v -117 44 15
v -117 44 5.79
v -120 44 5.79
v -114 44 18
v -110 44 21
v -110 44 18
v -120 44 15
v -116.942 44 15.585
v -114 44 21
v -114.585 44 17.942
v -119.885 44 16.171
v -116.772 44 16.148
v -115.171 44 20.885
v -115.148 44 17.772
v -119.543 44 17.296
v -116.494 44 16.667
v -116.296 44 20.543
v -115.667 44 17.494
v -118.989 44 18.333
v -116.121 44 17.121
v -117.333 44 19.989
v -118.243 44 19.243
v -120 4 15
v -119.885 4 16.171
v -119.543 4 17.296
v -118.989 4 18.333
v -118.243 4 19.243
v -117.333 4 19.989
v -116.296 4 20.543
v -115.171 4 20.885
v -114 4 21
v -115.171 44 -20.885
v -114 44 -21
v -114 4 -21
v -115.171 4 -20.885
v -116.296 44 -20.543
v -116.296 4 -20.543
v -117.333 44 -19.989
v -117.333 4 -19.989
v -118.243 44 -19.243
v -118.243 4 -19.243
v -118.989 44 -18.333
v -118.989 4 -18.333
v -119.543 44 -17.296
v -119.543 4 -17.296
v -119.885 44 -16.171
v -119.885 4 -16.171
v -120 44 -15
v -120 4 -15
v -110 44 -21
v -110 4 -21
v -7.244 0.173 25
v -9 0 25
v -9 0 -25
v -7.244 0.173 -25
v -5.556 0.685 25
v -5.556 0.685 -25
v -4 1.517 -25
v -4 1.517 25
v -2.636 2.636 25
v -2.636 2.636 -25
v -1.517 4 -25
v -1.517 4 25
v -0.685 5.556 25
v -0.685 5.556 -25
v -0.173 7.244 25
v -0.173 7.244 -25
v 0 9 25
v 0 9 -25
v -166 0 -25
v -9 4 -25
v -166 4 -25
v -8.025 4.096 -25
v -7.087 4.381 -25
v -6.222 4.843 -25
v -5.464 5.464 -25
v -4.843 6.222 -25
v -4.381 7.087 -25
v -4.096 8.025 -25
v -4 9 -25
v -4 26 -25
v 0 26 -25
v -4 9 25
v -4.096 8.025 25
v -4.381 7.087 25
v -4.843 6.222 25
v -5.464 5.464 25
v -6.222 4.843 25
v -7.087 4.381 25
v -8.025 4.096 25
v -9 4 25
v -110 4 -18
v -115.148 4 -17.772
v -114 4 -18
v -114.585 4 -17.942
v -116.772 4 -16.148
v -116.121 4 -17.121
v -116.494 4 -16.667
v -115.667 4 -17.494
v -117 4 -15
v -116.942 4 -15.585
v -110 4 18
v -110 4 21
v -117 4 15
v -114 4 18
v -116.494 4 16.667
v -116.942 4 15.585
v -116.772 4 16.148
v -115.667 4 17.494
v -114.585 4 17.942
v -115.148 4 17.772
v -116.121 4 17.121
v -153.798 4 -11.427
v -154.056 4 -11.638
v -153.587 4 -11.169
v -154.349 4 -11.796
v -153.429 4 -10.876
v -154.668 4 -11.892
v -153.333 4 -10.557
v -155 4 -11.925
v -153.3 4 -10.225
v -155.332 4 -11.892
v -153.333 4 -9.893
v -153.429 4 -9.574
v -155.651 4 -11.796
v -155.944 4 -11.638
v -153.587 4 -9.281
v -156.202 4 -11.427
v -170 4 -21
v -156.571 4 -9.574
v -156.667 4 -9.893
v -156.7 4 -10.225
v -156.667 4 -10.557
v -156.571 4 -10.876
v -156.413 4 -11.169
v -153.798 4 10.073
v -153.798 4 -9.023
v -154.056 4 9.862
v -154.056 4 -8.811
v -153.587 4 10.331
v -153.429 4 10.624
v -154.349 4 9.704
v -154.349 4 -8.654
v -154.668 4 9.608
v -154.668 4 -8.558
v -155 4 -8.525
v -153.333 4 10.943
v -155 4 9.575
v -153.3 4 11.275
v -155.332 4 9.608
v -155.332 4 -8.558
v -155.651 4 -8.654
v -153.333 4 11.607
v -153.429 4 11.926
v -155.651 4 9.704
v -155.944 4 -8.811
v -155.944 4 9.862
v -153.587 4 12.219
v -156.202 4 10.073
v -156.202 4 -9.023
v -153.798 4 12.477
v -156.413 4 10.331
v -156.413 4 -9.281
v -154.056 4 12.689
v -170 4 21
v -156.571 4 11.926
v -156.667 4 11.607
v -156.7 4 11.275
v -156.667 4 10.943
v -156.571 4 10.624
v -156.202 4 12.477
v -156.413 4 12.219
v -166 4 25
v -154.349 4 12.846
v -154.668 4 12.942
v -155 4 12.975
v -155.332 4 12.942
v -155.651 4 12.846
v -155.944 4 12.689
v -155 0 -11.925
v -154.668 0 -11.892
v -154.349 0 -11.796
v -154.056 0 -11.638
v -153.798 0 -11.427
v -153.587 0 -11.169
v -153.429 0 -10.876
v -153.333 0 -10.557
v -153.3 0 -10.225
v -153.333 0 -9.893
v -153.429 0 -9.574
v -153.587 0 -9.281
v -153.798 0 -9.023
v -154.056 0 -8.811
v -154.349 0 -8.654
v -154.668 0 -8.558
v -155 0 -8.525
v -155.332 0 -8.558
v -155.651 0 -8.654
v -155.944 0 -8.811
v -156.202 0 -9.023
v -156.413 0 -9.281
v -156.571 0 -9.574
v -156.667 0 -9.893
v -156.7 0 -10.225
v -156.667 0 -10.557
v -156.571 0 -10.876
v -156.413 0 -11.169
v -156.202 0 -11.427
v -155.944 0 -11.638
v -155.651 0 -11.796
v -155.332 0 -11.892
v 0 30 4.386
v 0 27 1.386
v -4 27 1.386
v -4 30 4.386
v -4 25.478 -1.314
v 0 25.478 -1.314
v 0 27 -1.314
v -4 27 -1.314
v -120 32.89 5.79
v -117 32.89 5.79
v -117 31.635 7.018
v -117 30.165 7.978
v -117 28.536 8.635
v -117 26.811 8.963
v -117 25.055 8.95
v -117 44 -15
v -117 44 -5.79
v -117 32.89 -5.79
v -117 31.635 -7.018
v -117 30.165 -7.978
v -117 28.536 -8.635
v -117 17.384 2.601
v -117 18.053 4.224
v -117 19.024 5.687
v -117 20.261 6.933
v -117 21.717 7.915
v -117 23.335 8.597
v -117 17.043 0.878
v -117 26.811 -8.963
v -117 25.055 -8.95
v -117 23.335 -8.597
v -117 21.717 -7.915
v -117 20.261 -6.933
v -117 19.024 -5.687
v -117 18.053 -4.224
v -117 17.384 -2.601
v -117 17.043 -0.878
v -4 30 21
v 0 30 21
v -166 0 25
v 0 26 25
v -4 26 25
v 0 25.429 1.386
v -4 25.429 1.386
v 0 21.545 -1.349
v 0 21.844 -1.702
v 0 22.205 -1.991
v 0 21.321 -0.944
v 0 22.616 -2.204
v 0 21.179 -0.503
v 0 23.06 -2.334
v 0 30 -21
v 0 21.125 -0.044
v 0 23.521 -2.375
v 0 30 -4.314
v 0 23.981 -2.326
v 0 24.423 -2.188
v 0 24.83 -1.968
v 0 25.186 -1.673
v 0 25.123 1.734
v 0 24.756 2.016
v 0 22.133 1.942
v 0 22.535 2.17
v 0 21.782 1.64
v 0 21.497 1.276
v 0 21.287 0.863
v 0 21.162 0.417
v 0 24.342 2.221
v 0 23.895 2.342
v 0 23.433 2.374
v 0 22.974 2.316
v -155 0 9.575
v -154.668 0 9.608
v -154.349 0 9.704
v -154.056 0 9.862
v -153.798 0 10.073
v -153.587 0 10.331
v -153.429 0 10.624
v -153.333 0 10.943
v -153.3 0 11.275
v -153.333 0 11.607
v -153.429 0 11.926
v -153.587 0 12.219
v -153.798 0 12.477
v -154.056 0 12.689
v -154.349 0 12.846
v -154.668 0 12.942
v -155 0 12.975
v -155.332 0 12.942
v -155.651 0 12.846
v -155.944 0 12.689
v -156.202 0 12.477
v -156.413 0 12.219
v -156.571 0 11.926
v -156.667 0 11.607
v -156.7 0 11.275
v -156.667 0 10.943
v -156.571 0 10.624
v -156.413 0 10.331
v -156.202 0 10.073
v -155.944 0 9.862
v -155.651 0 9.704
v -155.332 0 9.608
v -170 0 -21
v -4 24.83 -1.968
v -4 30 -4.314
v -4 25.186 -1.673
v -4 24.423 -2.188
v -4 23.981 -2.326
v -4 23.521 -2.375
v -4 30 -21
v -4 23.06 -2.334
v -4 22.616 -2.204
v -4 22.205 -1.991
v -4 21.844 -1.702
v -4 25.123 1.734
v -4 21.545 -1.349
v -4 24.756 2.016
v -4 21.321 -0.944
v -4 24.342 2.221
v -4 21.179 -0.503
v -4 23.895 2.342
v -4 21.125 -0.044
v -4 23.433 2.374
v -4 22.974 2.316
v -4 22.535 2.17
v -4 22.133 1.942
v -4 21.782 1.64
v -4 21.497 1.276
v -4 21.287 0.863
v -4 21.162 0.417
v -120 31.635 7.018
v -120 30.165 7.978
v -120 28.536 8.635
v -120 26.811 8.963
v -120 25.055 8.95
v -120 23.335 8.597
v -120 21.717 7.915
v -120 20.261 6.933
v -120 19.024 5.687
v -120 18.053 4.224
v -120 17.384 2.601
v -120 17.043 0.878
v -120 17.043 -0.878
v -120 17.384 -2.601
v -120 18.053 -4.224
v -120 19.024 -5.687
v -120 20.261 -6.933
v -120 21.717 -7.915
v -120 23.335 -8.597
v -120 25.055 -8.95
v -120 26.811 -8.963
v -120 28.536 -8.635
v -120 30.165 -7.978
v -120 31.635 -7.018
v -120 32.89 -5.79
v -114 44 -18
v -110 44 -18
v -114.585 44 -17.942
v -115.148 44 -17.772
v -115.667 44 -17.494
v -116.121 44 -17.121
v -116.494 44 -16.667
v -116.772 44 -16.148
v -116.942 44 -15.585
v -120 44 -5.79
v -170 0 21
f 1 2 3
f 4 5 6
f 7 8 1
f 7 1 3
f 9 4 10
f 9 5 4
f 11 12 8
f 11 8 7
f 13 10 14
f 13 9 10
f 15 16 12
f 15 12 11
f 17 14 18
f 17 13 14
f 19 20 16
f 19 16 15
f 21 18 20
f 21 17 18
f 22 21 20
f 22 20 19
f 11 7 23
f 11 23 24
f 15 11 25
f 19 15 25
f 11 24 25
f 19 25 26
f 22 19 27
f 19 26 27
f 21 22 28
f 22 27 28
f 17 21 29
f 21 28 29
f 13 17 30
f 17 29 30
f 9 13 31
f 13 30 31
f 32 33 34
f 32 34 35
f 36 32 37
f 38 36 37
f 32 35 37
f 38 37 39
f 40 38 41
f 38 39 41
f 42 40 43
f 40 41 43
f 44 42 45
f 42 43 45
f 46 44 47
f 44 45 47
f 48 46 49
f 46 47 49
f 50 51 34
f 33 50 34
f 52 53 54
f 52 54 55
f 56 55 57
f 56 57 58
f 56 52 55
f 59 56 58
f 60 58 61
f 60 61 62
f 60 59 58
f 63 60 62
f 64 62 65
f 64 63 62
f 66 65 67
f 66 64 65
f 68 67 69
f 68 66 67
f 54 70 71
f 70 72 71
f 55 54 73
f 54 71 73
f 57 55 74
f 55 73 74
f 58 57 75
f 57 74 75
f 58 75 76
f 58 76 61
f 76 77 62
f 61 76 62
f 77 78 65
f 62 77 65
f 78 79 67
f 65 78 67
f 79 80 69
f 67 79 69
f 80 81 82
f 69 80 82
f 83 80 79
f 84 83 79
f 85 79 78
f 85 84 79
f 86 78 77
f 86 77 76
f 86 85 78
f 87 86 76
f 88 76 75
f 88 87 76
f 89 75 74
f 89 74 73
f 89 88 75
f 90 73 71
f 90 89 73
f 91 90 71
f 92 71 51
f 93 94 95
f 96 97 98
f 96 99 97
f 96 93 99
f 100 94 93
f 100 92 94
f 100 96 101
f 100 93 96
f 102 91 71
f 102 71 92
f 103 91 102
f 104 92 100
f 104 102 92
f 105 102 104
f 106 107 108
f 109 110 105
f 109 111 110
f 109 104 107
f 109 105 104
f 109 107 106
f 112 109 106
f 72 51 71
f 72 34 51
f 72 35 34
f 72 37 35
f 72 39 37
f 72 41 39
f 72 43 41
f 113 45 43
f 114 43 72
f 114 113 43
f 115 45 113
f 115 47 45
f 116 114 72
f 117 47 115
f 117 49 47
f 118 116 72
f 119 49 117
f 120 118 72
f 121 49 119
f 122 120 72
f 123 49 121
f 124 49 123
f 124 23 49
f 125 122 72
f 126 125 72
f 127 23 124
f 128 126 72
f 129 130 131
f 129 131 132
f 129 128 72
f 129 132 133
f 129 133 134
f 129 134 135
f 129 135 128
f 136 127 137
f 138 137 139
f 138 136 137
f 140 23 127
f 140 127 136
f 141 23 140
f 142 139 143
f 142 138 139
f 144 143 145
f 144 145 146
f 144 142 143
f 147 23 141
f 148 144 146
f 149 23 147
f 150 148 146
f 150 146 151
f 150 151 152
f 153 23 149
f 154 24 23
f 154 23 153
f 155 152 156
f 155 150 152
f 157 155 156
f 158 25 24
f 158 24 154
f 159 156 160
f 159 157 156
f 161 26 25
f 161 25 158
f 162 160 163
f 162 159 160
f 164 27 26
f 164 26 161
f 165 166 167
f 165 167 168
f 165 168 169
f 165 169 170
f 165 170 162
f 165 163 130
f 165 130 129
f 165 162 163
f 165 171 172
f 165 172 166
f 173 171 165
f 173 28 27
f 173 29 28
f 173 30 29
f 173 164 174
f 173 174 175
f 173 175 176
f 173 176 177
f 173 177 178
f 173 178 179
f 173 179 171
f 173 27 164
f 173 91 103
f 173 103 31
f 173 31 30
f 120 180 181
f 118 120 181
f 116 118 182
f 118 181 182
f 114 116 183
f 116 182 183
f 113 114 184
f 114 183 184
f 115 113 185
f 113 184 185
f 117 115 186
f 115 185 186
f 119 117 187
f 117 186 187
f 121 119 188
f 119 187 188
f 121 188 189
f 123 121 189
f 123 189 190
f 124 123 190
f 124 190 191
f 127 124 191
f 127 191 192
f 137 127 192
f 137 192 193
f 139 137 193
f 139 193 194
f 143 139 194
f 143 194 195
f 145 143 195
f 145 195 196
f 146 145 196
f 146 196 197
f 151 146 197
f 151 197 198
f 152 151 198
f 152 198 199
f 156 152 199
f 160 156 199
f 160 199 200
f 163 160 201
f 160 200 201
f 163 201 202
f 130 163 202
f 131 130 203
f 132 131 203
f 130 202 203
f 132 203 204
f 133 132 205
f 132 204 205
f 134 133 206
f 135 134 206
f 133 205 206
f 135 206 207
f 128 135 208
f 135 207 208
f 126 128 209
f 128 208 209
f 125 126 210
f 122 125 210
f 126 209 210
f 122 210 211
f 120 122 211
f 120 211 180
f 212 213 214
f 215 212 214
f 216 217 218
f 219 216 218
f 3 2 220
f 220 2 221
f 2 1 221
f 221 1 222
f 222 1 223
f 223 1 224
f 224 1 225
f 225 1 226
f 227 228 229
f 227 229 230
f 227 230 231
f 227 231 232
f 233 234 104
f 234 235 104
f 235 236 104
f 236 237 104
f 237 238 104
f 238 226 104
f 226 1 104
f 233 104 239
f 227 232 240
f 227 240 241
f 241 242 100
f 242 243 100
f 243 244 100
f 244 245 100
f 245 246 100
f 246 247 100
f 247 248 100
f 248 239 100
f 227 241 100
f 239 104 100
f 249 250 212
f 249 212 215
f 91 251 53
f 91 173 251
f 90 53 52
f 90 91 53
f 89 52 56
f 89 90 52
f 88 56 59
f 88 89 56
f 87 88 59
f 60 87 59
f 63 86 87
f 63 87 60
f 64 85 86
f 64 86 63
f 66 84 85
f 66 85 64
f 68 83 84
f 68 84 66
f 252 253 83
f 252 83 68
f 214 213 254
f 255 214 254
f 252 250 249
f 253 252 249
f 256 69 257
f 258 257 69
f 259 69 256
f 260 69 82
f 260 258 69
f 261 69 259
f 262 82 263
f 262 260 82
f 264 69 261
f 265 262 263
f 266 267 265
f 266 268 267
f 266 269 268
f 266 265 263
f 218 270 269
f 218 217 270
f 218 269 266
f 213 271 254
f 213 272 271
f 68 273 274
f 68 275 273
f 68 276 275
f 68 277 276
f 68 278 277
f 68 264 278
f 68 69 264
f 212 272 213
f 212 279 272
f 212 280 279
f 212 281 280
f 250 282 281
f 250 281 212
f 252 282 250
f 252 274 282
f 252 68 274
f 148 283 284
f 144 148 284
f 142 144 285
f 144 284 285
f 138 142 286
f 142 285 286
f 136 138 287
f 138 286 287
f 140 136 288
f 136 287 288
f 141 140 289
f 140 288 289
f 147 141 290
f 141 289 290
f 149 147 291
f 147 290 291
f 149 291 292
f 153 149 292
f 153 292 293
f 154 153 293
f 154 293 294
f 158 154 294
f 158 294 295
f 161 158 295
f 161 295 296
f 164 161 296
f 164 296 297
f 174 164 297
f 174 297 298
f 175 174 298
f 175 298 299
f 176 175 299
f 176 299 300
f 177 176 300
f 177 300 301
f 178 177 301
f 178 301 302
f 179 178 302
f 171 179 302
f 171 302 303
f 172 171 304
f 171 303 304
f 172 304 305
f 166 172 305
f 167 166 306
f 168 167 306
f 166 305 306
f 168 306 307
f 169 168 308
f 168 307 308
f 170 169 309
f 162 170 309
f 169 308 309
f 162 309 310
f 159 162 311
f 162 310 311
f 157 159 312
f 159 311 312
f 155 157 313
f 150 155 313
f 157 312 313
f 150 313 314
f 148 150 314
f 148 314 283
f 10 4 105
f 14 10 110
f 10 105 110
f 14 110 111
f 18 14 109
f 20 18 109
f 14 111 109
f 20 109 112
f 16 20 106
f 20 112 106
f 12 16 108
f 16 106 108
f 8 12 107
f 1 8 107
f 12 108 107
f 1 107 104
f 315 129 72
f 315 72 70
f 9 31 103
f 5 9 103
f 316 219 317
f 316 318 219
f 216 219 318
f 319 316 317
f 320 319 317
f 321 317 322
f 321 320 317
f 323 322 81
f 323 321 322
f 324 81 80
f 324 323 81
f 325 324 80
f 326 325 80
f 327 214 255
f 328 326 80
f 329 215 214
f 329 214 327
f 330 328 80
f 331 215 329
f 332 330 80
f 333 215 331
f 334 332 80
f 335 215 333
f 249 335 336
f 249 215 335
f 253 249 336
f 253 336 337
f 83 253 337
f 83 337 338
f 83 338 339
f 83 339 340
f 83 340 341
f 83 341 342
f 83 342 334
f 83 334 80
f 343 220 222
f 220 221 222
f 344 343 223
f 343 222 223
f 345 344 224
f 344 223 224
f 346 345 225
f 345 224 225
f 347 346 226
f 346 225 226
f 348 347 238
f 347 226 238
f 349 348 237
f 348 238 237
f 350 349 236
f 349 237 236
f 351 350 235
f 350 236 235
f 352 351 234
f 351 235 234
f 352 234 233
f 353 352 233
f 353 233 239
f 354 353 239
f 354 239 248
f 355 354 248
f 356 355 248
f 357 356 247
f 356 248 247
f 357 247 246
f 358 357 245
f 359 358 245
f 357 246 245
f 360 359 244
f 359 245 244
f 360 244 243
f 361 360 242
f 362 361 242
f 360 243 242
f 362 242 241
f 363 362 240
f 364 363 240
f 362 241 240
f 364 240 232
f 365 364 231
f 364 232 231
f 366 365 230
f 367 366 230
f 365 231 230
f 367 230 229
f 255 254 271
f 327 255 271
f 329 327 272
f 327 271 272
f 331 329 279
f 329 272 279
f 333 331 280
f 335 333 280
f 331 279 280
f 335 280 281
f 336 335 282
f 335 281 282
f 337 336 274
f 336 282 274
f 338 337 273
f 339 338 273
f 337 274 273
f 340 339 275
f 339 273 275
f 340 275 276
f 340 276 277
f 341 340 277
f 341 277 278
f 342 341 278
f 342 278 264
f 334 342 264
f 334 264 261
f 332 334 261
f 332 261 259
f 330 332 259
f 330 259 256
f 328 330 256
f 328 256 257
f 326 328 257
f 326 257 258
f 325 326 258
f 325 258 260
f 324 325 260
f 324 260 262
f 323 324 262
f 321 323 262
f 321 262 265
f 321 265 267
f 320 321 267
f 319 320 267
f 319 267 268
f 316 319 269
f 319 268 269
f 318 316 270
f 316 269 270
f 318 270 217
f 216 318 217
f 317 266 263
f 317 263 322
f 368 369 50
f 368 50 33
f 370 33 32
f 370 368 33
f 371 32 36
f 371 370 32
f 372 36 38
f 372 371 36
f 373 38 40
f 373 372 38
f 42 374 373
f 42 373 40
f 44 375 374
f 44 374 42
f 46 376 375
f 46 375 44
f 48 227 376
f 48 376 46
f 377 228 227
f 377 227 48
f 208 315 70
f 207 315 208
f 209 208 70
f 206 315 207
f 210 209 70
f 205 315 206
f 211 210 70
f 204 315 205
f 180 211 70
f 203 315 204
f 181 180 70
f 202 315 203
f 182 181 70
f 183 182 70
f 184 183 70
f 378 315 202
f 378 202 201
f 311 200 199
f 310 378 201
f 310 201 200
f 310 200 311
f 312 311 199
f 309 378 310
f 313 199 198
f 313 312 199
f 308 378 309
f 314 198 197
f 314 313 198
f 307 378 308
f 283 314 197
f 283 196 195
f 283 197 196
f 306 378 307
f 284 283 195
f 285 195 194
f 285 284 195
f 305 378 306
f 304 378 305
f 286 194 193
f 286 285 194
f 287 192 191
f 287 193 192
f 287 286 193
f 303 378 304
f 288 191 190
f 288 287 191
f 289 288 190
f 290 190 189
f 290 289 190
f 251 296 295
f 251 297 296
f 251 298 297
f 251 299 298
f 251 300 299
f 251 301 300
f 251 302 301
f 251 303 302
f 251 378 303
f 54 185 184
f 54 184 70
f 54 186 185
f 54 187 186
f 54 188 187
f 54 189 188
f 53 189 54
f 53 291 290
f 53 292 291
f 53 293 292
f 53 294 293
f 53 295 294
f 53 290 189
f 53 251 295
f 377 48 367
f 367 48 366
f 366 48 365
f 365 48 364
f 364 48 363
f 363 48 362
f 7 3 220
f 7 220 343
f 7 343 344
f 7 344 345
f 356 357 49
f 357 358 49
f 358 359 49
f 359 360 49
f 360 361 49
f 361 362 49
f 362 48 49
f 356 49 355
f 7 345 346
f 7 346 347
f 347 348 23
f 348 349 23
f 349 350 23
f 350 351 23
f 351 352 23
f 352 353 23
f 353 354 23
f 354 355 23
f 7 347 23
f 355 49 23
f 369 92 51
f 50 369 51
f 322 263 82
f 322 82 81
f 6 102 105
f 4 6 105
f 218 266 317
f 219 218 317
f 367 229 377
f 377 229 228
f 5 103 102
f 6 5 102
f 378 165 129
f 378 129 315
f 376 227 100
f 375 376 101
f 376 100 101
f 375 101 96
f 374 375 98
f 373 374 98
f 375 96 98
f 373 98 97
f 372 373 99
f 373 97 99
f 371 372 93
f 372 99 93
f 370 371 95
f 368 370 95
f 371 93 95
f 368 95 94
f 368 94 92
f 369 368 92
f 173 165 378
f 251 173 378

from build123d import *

# Parameters (mm, degrees)
EXTRU_MINCE1_DEPTH      = 25
EXTRU_MINCE2_DEPTH      = 40
ENL_V_MAT_EXTRU_1_REACH = 129.475
ESQUISSE3_R             = 9
CHANFREIN1_SIZE         = 4
ESQUISSE4_R             = 2.375
EXTRUSION1_DEPTH        = 10
CHANFREIN2_SIZE         = 3
EXTRUSION2_DEPTH        = 3
D_GAGEMENT_M31_D        = 3.4
D_GAGEMENT_M31_DEPTH    = 15
D_GAGEMENT_M31_TIP      = 1.021463052


with BuildPart() as part:
    # Esquisse1 → Extru.-Mince1 (new, symmetric)
    with BuildSketch(Plane.XY):
        with BuildLine():
            Line((-170, 0), (-9, 0))
            ThreePointArc((-9, 0), (-2.636038969, 2.636038969), (0, 9))
            Line((0, 9), (0, 30))
            Line((0, 30), (-4, 30))
            Line((-4, 30), (-4, 9))
            ThreePointArc((-4, 9), (-5.464466094, 5.464466094), (-9, 4))
            Line((-9, 4), (-170, 4))
            Line((-170, 4), (-170, 0))
        make_face()
    extrude(amount=EXTRU_MINCE1_DEPTH, both=True)

    # Esquisse2 → Extru.-Mince2 (add)
    with BuildSketch(Plane(origin=(0, 4, 0), x_dir=(-1, 0, 0), z_dir=(0, 1, 0))):
        with BuildLine():
            Line((110, -21), (114, -21))
            ThreePointArc((114, -21), (118.242640687, -19.242640687), (120, -15))
            Line((120, -15), (120, 15))
            ThreePointArc((120, 15), (118.242640687, 19.242640687), (114, 21))
            Line((114, 21), (110, 21))
            Line((110, 21), (110, 18))
            Line((110, 18), (114, 18))
            ThreePointArc((114, 18), (116.121320344, 17.121320344), (117, 15))
            Line((117, 15), (117, -15))
            ThreePointArc((117, -15), (116.121320344, -17.121320344), (114, -18))
            Line((114, -18), (110, -18))
            Line((110, -18), (110, -21))
        make_face()
    extrude(amount=EXTRU_MINCE2_DEPTH)

    # Esquisse3 → Enlèv. mat.-Extru.1 (cut, up to next)
    with BuildSketch(Plane(origin=(-117, 0, 0), x_dir=(0, 0, -1), z_dir=(1, 0, 0)), mode=Mode.PRIVATE) as enl_v_mat_extru_1_sk1:
        with Locations((0, 26)):
            Circle(ESQUISSE3_R)
    enl_v_mat_extru_1_tool1 = extrude(enl_v_mat_extru_1_sk1.sketch, amount=-ENL_V_MAT_EXTRU_1_REACH, mode=Mode.PRIVATE) & part.part
    add(enl_v_mat_extru_1_tool1.solids().sort_by_distance((-117, 26, 0))[0], mode=Mode.SUBTRACT)

    # Chanfrein1
    chanfrein1_edges = [part.edges().sort_by_distance(p)[0] for p in [
        (-170, 2, 25),
        (-170, 2, -25),
        (-2, 30, 25),
        (-2, 30, -25),
    ]]
    chamfer(chanfrein1_edges, length=CHANFREIN1_SIZE)

    # Esquisse4 → Extrusion1 (cut)
    with BuildSketch(Plane(origin=(0, 0, 0), x_dir=(0, 0, -1), z_dir=(1, 0, 0))):
        with Locations((0, 23.5)):
            Circle(ESQUISSE4_R)
        with BuildLine():
            Line((1.313915472, 30), (-1.386084528, 30))
            Line((-1.386084528, 30), (-1.386084528, 25.428573224))
            ThreePointArc((-1.386084528, 25.428573224), (-0.043862657, 25.874594927), (1.313915472, 25.478446646))
            Line((1.313915472, 25.478446646), (1.313915472, 30))
        make_face()
    extrude(amount=-EXTRUSION1_DEPTH, mode=Mode.SUBTRACT)

    # Chanfrein2
    chanfrein2_edges = [part.edges().sort_by_distance(p)[0] for p in [
        (-2, 30, 1.386084528),
        (-2, 30, -1.313915472),
    ]]
    chamfer(chanfrein2_edges, length=CHANFREIN2_SIZE)

    # Esquisse5 → Extrusion2 (cut)
    with BuildSketch(Plane(origin=(-117, 0, 0), x_dir=(0, 0, -1), z_dir=(1, 0, 0))):
        with BuildLine():
            Line((5.79, 44), (-5.79, 44))
            Line((-5.79, 44), (-5.79, 32.890275756))
            ThreePointArc((-5.79, 32.890275756), (0, 35), (5.79, 32.890275756))
            Line((5.79, 32.890275756), (5.79, 44))
        make_face()
    extrude(amount=-EXTRUSION2_DEPTH, mode=Mode.SUBTRACT)

    # Dégagement M31
    with Locations(Plane(origin=(-155, 4, -10.224980601), x_dir=(0, 0, 1), z_dir=(0, 1, 0))):
        with Locations((0, 0), (21.5, 0)):
            Hole(D_GAGEMENT_M31_D / 2, depth=D_GAGEMENT_M31_DEPTH)
            with Locations((0, 0, -(D_GAGEMENT_M31_DEPTH + D_GAGEMENT_M31_TIP / 2))):  # 118° drill point
                Cone(0, D_GAGEMENT_M31_D / 2, D_GAGEMENT_M31_TIP, mode=Mode.SUBTRACT)


solid = part.part
